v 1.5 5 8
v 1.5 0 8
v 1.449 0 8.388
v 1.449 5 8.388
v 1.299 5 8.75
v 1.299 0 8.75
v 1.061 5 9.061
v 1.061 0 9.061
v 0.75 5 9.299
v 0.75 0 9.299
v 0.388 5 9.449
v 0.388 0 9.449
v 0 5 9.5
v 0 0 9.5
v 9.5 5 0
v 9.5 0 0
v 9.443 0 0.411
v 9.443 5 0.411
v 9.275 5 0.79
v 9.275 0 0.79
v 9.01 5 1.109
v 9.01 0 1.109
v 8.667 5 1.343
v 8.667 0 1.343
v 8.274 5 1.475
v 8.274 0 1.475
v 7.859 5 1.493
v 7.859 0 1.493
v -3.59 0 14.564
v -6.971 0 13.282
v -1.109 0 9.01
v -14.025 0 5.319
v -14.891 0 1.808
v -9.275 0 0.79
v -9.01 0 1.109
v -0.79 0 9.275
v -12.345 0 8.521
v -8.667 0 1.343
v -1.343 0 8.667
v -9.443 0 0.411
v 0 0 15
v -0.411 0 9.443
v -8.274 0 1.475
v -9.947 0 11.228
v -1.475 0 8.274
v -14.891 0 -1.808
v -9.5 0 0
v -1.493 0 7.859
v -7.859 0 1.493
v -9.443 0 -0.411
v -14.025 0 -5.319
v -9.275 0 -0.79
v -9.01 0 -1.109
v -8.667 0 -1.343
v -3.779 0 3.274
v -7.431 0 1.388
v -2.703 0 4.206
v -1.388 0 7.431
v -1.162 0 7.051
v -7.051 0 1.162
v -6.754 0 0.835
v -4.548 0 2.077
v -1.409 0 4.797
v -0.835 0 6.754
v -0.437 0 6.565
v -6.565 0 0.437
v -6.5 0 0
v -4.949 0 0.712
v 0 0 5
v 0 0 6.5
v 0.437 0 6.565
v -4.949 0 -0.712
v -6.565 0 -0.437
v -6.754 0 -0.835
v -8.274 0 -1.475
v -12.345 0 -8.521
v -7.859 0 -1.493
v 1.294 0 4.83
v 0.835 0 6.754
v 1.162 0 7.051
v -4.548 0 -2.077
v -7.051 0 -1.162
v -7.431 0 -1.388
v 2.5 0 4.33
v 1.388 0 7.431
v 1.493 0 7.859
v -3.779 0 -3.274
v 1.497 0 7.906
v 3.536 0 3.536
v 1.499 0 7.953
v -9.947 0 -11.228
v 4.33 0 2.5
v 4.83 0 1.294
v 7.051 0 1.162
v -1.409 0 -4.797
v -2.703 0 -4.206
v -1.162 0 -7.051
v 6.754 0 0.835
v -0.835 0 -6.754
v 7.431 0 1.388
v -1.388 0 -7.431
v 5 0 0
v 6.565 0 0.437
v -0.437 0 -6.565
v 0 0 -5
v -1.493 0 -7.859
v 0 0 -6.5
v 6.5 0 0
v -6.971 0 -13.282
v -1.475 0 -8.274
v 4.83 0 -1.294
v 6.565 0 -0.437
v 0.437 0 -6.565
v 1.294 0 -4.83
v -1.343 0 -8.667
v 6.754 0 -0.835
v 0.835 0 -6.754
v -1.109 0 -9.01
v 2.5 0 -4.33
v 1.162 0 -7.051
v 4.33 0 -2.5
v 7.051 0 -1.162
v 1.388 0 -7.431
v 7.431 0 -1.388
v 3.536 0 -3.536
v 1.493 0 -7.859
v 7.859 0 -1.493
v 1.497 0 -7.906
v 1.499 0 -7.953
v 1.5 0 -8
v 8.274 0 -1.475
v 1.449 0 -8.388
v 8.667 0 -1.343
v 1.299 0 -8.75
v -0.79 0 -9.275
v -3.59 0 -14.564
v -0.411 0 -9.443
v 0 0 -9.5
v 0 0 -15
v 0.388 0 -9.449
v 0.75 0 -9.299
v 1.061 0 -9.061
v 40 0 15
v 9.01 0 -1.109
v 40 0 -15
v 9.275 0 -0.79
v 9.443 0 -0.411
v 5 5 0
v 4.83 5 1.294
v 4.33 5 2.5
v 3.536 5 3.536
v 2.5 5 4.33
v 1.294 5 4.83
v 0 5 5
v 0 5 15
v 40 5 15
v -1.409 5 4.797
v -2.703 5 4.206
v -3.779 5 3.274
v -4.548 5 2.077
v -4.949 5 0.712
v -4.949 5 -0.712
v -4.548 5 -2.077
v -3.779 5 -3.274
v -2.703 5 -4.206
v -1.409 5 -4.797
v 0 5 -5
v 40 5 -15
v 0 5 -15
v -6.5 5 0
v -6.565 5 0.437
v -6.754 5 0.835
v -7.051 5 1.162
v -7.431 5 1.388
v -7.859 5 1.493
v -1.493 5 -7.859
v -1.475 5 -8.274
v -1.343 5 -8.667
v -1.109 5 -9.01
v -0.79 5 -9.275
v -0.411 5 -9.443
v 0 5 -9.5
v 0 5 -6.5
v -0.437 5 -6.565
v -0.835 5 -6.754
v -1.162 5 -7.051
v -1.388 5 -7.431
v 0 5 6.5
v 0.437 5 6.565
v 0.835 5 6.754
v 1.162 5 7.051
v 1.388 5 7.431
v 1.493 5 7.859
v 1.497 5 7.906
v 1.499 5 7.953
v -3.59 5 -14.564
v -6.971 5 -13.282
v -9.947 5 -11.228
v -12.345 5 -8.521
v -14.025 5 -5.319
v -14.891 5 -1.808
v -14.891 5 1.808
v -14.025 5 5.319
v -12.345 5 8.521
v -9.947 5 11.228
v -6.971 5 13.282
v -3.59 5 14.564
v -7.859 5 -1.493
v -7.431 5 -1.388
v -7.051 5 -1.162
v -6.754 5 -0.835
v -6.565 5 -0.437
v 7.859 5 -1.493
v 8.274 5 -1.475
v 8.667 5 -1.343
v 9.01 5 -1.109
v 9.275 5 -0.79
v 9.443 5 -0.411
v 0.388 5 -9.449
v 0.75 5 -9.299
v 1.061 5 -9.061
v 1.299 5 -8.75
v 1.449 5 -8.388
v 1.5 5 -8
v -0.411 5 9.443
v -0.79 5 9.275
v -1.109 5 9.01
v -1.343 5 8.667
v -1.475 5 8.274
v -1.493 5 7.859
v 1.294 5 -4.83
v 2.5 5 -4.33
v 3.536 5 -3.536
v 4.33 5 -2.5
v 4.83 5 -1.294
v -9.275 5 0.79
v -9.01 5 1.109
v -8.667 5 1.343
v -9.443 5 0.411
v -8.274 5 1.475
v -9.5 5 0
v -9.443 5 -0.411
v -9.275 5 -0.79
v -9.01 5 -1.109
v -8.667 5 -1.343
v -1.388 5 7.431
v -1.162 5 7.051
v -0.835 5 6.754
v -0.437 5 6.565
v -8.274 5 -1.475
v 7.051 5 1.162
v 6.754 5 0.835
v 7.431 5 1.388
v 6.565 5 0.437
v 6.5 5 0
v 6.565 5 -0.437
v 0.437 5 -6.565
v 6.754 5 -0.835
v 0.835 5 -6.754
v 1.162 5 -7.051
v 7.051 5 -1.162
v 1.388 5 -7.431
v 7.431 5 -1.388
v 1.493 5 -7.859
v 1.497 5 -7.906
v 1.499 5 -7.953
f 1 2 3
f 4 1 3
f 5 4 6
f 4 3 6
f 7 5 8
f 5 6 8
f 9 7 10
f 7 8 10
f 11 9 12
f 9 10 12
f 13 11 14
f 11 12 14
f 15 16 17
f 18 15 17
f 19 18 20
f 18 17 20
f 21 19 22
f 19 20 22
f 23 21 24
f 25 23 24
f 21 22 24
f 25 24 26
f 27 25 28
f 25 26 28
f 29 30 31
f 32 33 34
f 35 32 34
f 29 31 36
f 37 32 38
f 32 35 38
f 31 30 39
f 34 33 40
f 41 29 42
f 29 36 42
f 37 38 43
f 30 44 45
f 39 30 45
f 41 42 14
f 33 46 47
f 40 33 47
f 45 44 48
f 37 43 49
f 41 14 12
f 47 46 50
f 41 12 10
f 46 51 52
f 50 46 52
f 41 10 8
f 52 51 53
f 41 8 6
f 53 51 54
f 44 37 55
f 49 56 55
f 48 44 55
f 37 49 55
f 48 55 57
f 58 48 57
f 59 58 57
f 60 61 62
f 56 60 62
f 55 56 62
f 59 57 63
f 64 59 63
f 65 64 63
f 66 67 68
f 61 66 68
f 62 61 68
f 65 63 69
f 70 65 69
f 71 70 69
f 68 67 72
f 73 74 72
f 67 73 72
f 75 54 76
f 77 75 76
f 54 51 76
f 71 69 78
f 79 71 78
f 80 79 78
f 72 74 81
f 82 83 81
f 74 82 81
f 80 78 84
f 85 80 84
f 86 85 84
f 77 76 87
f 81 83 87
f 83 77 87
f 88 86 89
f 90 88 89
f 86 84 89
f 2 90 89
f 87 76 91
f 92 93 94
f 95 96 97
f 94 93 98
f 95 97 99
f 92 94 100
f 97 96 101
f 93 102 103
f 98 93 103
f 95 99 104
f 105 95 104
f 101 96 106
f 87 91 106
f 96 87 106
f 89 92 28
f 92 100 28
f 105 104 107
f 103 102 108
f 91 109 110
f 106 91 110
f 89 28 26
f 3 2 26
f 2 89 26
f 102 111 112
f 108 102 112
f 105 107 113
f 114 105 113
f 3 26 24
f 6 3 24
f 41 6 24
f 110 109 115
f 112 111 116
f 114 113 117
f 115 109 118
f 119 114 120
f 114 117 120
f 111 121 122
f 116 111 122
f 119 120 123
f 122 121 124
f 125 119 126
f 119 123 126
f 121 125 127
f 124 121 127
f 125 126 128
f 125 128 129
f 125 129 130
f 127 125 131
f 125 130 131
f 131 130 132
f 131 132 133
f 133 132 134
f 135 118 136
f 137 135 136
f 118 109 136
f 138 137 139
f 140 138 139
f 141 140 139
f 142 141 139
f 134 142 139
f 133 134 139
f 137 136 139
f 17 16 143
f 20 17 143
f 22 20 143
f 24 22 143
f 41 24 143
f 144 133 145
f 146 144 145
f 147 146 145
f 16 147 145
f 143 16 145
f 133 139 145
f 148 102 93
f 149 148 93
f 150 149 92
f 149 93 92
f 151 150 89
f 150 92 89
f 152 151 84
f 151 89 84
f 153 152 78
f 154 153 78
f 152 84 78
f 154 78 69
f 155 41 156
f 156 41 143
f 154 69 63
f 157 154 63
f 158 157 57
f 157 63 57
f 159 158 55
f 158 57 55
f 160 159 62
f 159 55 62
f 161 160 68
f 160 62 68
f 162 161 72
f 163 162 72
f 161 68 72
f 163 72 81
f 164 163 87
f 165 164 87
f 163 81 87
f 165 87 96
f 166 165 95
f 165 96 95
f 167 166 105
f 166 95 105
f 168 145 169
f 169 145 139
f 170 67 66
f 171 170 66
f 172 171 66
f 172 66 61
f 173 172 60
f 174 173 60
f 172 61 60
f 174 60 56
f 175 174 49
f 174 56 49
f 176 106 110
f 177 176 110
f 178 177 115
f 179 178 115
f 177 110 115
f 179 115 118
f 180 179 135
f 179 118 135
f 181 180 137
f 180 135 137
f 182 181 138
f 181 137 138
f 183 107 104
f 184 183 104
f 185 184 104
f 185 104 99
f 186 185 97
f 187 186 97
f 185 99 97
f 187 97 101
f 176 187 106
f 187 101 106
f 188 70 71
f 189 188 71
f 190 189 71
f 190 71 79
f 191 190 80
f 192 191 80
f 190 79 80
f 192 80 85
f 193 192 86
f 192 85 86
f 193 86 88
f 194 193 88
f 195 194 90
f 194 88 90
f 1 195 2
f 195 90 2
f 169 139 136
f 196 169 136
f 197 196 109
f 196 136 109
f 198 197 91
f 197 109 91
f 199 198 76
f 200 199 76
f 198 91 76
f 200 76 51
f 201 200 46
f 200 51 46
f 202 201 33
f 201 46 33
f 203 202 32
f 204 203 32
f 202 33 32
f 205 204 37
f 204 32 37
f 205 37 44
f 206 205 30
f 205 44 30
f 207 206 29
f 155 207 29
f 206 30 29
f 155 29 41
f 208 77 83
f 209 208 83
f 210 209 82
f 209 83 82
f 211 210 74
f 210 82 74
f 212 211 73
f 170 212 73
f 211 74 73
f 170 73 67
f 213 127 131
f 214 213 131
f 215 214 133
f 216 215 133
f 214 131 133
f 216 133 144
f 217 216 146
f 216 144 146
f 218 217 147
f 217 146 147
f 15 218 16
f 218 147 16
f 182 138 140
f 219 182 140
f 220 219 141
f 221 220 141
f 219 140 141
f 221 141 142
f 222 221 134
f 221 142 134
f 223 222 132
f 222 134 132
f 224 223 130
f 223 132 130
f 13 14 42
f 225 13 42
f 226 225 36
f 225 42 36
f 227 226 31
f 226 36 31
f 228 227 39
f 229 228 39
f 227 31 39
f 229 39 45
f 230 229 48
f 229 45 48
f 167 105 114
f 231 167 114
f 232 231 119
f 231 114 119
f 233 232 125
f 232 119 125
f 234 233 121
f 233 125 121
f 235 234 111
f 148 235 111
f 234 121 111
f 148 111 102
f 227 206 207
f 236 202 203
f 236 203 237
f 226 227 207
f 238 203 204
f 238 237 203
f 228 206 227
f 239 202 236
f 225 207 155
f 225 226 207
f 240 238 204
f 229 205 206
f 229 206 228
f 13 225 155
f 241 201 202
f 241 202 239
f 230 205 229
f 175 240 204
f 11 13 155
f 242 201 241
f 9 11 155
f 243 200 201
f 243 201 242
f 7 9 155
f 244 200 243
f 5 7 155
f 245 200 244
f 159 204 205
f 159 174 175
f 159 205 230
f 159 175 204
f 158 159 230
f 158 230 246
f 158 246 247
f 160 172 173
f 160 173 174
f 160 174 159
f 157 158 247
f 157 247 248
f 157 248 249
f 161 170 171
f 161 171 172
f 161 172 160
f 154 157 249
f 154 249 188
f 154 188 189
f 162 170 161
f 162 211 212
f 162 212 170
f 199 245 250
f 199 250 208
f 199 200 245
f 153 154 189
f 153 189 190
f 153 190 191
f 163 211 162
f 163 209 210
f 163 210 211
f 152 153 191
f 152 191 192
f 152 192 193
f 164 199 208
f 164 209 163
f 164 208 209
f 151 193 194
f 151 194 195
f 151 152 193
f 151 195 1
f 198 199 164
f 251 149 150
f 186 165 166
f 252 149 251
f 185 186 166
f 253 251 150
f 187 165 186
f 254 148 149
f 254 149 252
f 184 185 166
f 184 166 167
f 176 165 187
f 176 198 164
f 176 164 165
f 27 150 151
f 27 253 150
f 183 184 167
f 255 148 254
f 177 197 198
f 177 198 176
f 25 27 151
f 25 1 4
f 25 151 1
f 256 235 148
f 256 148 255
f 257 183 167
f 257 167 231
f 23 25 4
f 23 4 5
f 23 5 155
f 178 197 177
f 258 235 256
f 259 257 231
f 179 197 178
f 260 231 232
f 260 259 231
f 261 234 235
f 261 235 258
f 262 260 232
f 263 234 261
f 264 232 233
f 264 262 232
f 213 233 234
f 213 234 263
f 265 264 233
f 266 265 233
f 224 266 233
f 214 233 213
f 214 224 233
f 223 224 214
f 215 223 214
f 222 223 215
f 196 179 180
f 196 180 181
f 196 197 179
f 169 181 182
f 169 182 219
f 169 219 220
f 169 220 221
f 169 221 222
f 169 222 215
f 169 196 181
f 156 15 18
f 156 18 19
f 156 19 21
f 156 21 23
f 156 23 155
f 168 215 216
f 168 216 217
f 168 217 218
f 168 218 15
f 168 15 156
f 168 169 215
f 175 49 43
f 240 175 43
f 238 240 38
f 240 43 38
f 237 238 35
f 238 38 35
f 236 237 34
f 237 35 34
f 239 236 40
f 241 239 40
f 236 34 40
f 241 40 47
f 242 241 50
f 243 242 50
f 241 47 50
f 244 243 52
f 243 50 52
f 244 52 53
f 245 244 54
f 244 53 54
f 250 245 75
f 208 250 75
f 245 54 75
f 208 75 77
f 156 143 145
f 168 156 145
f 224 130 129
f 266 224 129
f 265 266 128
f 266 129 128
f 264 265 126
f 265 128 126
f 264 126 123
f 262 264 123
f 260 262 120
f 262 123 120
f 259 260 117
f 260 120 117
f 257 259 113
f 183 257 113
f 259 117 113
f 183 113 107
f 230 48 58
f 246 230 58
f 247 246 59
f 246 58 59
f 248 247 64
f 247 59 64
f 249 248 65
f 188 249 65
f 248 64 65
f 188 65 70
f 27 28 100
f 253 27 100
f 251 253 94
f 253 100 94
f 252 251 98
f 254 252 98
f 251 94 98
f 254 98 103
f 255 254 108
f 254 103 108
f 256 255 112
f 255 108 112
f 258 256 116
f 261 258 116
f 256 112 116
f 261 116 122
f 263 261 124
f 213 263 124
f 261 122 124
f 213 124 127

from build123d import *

# Parameters (mm, degrees)
BOSS_EXTRUDE1_DEPTH = 5


with BuildPart() as part:
    # Sketch1 → Boss-Extrude1 (new body)
    with BuildSketch(Plane(origin=(0, 0, 0), x_dir=(1, 0, 0), z_dir=(0, 1, 0))):
        with BuildLine():
            ThreePointArc((-7.859375, 1.493393655), (-5.656854249, 5.656854249), (-1.493393655, 7.859375))
            ThreePointArc((-1.493393655, 7.859375), (-1.109264959, 9.009718401), (0, 9.5))
            Line((0, 9.5), (0, 15))
            ThreePointArc((0, 15), (-15, 0), (0, -15))
            Line((0, -15), (0, -9.5))
            ThreePointArc((0, -9.5), (-1.109264959, -9.009718401), (-1.493393655, -7.859375))
            ThreePointArc((-1.493393655, -7.859375), (-5.656854249, -5.656854249), (-7.859375, -1.493393655))
            ThreePointArc((-7.859375, -1.493393655), (-9.5, 0), (-7.859375, 1.493393655))
        make_face()
        with BuildLine():
            ThreePointArc((1.5, 8), (1.498347504, 7.929609954), (1.493393655, 7.859375))
            ThreePointArc((1.493393655, 7.859375), (5.656854249, 5.656854249), (7.859375, 1.493393655))
            ThreePointArc((7.859375, 1.493393655), (9.009718401, 1.109264959), (9.5, 0))
            ThreePointArc((9.5, 0), (9.009718401, -1.109264959), (7.859375, -1.493393655))
            ThreePointArc((7.859375, -1.493393655), (5.656854249, -5.656854249), (1.493393655, -7.859375))
            ThreePointArc((1.493393655, -7.859375), (1.498347504, -7.929609954), (1.5, -8))
            ThreePointArc((1.5, -8), (1.060660172, -9.060660172), (0, -9.5))
            Line((0, -9.5), (0, -15))
            ThreePointArc((0, -15), (10.606601718, -10.606601718), (15, 0))
            ThreePointArc((15, 0), (10.606601718, 10.606601718), (0, 15))
            Line((0, 15), (0, 9.5))
            ThreePointArc((0, 9.5), (1.060660172, 9.060660172), (1.5, 8))
        make_face()
        with BuildLine():
            ThreePointArc((0, -5), (-5, 0), (0, 5))
            Line((0, 5), (0, 6.5))
            ThreePointArc((0, 6.5), (-1.009718401, 6.890735041), (-1.493393655, 7.859375))
            ThreePointArc((-1.493393655, 7.859375), (-5.656854249, 5.656854249), (-7.859375, 1.493393655))
            ThreePointArc((-7.859375, 1.493393655), (-6.890735041, 1.009718401), (-6.5, 0))
            ThreePointArc((-6.5, 0), (-6.890735041, -1.009718401), (-7.859375, -1.493393655))
            ThreePointArc((-7.859375, -1.493393655), (-5.656854249, -5.656854249), (-1.493393655, -7.859375))
            ThreePointArc((-1.493393655, -7.859375), (-1.009718401, -6.890735041), (0, -6.5))
            Line((0, -6.5), (0, -5))
        make_face()
        with BuildLine():
            Line((0, 6.5), (0, 5))
            ThreePointArc((0, 5), (3.535533906, 3.535533906), (5, 0))
            ThreePointArc((5, 0), (3.535533906, -3.535533906), (0, -5))
            Line((0, -5), (0, -6.5))
            ThreePointArc((0, -6.5), (1.009718401, -6.890735041), (1.493393655, -7.859375))
            ThreePointArc((1.493393655, -7.859375), (5.656854249, -5.656854249), (7.859375, -1.493393655))
            ThreePointArc((7.859375, -1.493393655), (6.5, 0), (7.859375, 1.493393655))
            ThreePointArc((7.859375, 1.493393655), (5.656854249, 5.656854249), (1.493393655, 7.859375))
            ThreePointArc((1.493393655, 7.859375), (1.009718401, 6.890735041), (0, 6.5))
        make_face()
        with BuildLine():
            Line((40, 15), (0, 15))
            ThreePointArc((0, 15), (10.606601718, 10.606601718), (15, 0))
            ThreePointArc((15, 0), (10.606601718, -10.606601718), (0, -15))
            Line((0, -15), (40, -15))
            Line((40, -15), (40, 15))
        make_face()
    extrude(amount=BOSS_EXTRUDE1_DEPTH)


solid = part.part
